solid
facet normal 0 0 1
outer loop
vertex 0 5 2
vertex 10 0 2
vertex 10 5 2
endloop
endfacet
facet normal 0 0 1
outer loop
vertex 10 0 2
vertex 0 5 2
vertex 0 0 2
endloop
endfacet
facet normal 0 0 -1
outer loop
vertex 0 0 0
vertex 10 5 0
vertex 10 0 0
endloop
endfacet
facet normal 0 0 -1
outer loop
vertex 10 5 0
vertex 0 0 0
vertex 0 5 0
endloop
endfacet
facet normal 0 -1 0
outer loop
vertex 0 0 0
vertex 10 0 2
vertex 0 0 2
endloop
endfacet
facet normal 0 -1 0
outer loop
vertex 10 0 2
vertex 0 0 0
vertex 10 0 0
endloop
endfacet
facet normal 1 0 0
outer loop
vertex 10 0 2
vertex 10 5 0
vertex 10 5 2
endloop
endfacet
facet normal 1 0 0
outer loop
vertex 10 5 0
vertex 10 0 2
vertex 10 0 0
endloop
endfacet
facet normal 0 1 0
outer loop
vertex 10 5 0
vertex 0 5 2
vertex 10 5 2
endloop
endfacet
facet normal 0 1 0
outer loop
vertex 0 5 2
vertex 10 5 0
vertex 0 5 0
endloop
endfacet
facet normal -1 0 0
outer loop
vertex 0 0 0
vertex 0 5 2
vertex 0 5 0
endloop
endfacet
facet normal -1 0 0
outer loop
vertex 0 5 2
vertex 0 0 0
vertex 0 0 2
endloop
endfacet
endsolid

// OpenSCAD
module spacer(width, height, depth) {
  cube([width, height, depth]);
}

spacer(10, 5, 2);
